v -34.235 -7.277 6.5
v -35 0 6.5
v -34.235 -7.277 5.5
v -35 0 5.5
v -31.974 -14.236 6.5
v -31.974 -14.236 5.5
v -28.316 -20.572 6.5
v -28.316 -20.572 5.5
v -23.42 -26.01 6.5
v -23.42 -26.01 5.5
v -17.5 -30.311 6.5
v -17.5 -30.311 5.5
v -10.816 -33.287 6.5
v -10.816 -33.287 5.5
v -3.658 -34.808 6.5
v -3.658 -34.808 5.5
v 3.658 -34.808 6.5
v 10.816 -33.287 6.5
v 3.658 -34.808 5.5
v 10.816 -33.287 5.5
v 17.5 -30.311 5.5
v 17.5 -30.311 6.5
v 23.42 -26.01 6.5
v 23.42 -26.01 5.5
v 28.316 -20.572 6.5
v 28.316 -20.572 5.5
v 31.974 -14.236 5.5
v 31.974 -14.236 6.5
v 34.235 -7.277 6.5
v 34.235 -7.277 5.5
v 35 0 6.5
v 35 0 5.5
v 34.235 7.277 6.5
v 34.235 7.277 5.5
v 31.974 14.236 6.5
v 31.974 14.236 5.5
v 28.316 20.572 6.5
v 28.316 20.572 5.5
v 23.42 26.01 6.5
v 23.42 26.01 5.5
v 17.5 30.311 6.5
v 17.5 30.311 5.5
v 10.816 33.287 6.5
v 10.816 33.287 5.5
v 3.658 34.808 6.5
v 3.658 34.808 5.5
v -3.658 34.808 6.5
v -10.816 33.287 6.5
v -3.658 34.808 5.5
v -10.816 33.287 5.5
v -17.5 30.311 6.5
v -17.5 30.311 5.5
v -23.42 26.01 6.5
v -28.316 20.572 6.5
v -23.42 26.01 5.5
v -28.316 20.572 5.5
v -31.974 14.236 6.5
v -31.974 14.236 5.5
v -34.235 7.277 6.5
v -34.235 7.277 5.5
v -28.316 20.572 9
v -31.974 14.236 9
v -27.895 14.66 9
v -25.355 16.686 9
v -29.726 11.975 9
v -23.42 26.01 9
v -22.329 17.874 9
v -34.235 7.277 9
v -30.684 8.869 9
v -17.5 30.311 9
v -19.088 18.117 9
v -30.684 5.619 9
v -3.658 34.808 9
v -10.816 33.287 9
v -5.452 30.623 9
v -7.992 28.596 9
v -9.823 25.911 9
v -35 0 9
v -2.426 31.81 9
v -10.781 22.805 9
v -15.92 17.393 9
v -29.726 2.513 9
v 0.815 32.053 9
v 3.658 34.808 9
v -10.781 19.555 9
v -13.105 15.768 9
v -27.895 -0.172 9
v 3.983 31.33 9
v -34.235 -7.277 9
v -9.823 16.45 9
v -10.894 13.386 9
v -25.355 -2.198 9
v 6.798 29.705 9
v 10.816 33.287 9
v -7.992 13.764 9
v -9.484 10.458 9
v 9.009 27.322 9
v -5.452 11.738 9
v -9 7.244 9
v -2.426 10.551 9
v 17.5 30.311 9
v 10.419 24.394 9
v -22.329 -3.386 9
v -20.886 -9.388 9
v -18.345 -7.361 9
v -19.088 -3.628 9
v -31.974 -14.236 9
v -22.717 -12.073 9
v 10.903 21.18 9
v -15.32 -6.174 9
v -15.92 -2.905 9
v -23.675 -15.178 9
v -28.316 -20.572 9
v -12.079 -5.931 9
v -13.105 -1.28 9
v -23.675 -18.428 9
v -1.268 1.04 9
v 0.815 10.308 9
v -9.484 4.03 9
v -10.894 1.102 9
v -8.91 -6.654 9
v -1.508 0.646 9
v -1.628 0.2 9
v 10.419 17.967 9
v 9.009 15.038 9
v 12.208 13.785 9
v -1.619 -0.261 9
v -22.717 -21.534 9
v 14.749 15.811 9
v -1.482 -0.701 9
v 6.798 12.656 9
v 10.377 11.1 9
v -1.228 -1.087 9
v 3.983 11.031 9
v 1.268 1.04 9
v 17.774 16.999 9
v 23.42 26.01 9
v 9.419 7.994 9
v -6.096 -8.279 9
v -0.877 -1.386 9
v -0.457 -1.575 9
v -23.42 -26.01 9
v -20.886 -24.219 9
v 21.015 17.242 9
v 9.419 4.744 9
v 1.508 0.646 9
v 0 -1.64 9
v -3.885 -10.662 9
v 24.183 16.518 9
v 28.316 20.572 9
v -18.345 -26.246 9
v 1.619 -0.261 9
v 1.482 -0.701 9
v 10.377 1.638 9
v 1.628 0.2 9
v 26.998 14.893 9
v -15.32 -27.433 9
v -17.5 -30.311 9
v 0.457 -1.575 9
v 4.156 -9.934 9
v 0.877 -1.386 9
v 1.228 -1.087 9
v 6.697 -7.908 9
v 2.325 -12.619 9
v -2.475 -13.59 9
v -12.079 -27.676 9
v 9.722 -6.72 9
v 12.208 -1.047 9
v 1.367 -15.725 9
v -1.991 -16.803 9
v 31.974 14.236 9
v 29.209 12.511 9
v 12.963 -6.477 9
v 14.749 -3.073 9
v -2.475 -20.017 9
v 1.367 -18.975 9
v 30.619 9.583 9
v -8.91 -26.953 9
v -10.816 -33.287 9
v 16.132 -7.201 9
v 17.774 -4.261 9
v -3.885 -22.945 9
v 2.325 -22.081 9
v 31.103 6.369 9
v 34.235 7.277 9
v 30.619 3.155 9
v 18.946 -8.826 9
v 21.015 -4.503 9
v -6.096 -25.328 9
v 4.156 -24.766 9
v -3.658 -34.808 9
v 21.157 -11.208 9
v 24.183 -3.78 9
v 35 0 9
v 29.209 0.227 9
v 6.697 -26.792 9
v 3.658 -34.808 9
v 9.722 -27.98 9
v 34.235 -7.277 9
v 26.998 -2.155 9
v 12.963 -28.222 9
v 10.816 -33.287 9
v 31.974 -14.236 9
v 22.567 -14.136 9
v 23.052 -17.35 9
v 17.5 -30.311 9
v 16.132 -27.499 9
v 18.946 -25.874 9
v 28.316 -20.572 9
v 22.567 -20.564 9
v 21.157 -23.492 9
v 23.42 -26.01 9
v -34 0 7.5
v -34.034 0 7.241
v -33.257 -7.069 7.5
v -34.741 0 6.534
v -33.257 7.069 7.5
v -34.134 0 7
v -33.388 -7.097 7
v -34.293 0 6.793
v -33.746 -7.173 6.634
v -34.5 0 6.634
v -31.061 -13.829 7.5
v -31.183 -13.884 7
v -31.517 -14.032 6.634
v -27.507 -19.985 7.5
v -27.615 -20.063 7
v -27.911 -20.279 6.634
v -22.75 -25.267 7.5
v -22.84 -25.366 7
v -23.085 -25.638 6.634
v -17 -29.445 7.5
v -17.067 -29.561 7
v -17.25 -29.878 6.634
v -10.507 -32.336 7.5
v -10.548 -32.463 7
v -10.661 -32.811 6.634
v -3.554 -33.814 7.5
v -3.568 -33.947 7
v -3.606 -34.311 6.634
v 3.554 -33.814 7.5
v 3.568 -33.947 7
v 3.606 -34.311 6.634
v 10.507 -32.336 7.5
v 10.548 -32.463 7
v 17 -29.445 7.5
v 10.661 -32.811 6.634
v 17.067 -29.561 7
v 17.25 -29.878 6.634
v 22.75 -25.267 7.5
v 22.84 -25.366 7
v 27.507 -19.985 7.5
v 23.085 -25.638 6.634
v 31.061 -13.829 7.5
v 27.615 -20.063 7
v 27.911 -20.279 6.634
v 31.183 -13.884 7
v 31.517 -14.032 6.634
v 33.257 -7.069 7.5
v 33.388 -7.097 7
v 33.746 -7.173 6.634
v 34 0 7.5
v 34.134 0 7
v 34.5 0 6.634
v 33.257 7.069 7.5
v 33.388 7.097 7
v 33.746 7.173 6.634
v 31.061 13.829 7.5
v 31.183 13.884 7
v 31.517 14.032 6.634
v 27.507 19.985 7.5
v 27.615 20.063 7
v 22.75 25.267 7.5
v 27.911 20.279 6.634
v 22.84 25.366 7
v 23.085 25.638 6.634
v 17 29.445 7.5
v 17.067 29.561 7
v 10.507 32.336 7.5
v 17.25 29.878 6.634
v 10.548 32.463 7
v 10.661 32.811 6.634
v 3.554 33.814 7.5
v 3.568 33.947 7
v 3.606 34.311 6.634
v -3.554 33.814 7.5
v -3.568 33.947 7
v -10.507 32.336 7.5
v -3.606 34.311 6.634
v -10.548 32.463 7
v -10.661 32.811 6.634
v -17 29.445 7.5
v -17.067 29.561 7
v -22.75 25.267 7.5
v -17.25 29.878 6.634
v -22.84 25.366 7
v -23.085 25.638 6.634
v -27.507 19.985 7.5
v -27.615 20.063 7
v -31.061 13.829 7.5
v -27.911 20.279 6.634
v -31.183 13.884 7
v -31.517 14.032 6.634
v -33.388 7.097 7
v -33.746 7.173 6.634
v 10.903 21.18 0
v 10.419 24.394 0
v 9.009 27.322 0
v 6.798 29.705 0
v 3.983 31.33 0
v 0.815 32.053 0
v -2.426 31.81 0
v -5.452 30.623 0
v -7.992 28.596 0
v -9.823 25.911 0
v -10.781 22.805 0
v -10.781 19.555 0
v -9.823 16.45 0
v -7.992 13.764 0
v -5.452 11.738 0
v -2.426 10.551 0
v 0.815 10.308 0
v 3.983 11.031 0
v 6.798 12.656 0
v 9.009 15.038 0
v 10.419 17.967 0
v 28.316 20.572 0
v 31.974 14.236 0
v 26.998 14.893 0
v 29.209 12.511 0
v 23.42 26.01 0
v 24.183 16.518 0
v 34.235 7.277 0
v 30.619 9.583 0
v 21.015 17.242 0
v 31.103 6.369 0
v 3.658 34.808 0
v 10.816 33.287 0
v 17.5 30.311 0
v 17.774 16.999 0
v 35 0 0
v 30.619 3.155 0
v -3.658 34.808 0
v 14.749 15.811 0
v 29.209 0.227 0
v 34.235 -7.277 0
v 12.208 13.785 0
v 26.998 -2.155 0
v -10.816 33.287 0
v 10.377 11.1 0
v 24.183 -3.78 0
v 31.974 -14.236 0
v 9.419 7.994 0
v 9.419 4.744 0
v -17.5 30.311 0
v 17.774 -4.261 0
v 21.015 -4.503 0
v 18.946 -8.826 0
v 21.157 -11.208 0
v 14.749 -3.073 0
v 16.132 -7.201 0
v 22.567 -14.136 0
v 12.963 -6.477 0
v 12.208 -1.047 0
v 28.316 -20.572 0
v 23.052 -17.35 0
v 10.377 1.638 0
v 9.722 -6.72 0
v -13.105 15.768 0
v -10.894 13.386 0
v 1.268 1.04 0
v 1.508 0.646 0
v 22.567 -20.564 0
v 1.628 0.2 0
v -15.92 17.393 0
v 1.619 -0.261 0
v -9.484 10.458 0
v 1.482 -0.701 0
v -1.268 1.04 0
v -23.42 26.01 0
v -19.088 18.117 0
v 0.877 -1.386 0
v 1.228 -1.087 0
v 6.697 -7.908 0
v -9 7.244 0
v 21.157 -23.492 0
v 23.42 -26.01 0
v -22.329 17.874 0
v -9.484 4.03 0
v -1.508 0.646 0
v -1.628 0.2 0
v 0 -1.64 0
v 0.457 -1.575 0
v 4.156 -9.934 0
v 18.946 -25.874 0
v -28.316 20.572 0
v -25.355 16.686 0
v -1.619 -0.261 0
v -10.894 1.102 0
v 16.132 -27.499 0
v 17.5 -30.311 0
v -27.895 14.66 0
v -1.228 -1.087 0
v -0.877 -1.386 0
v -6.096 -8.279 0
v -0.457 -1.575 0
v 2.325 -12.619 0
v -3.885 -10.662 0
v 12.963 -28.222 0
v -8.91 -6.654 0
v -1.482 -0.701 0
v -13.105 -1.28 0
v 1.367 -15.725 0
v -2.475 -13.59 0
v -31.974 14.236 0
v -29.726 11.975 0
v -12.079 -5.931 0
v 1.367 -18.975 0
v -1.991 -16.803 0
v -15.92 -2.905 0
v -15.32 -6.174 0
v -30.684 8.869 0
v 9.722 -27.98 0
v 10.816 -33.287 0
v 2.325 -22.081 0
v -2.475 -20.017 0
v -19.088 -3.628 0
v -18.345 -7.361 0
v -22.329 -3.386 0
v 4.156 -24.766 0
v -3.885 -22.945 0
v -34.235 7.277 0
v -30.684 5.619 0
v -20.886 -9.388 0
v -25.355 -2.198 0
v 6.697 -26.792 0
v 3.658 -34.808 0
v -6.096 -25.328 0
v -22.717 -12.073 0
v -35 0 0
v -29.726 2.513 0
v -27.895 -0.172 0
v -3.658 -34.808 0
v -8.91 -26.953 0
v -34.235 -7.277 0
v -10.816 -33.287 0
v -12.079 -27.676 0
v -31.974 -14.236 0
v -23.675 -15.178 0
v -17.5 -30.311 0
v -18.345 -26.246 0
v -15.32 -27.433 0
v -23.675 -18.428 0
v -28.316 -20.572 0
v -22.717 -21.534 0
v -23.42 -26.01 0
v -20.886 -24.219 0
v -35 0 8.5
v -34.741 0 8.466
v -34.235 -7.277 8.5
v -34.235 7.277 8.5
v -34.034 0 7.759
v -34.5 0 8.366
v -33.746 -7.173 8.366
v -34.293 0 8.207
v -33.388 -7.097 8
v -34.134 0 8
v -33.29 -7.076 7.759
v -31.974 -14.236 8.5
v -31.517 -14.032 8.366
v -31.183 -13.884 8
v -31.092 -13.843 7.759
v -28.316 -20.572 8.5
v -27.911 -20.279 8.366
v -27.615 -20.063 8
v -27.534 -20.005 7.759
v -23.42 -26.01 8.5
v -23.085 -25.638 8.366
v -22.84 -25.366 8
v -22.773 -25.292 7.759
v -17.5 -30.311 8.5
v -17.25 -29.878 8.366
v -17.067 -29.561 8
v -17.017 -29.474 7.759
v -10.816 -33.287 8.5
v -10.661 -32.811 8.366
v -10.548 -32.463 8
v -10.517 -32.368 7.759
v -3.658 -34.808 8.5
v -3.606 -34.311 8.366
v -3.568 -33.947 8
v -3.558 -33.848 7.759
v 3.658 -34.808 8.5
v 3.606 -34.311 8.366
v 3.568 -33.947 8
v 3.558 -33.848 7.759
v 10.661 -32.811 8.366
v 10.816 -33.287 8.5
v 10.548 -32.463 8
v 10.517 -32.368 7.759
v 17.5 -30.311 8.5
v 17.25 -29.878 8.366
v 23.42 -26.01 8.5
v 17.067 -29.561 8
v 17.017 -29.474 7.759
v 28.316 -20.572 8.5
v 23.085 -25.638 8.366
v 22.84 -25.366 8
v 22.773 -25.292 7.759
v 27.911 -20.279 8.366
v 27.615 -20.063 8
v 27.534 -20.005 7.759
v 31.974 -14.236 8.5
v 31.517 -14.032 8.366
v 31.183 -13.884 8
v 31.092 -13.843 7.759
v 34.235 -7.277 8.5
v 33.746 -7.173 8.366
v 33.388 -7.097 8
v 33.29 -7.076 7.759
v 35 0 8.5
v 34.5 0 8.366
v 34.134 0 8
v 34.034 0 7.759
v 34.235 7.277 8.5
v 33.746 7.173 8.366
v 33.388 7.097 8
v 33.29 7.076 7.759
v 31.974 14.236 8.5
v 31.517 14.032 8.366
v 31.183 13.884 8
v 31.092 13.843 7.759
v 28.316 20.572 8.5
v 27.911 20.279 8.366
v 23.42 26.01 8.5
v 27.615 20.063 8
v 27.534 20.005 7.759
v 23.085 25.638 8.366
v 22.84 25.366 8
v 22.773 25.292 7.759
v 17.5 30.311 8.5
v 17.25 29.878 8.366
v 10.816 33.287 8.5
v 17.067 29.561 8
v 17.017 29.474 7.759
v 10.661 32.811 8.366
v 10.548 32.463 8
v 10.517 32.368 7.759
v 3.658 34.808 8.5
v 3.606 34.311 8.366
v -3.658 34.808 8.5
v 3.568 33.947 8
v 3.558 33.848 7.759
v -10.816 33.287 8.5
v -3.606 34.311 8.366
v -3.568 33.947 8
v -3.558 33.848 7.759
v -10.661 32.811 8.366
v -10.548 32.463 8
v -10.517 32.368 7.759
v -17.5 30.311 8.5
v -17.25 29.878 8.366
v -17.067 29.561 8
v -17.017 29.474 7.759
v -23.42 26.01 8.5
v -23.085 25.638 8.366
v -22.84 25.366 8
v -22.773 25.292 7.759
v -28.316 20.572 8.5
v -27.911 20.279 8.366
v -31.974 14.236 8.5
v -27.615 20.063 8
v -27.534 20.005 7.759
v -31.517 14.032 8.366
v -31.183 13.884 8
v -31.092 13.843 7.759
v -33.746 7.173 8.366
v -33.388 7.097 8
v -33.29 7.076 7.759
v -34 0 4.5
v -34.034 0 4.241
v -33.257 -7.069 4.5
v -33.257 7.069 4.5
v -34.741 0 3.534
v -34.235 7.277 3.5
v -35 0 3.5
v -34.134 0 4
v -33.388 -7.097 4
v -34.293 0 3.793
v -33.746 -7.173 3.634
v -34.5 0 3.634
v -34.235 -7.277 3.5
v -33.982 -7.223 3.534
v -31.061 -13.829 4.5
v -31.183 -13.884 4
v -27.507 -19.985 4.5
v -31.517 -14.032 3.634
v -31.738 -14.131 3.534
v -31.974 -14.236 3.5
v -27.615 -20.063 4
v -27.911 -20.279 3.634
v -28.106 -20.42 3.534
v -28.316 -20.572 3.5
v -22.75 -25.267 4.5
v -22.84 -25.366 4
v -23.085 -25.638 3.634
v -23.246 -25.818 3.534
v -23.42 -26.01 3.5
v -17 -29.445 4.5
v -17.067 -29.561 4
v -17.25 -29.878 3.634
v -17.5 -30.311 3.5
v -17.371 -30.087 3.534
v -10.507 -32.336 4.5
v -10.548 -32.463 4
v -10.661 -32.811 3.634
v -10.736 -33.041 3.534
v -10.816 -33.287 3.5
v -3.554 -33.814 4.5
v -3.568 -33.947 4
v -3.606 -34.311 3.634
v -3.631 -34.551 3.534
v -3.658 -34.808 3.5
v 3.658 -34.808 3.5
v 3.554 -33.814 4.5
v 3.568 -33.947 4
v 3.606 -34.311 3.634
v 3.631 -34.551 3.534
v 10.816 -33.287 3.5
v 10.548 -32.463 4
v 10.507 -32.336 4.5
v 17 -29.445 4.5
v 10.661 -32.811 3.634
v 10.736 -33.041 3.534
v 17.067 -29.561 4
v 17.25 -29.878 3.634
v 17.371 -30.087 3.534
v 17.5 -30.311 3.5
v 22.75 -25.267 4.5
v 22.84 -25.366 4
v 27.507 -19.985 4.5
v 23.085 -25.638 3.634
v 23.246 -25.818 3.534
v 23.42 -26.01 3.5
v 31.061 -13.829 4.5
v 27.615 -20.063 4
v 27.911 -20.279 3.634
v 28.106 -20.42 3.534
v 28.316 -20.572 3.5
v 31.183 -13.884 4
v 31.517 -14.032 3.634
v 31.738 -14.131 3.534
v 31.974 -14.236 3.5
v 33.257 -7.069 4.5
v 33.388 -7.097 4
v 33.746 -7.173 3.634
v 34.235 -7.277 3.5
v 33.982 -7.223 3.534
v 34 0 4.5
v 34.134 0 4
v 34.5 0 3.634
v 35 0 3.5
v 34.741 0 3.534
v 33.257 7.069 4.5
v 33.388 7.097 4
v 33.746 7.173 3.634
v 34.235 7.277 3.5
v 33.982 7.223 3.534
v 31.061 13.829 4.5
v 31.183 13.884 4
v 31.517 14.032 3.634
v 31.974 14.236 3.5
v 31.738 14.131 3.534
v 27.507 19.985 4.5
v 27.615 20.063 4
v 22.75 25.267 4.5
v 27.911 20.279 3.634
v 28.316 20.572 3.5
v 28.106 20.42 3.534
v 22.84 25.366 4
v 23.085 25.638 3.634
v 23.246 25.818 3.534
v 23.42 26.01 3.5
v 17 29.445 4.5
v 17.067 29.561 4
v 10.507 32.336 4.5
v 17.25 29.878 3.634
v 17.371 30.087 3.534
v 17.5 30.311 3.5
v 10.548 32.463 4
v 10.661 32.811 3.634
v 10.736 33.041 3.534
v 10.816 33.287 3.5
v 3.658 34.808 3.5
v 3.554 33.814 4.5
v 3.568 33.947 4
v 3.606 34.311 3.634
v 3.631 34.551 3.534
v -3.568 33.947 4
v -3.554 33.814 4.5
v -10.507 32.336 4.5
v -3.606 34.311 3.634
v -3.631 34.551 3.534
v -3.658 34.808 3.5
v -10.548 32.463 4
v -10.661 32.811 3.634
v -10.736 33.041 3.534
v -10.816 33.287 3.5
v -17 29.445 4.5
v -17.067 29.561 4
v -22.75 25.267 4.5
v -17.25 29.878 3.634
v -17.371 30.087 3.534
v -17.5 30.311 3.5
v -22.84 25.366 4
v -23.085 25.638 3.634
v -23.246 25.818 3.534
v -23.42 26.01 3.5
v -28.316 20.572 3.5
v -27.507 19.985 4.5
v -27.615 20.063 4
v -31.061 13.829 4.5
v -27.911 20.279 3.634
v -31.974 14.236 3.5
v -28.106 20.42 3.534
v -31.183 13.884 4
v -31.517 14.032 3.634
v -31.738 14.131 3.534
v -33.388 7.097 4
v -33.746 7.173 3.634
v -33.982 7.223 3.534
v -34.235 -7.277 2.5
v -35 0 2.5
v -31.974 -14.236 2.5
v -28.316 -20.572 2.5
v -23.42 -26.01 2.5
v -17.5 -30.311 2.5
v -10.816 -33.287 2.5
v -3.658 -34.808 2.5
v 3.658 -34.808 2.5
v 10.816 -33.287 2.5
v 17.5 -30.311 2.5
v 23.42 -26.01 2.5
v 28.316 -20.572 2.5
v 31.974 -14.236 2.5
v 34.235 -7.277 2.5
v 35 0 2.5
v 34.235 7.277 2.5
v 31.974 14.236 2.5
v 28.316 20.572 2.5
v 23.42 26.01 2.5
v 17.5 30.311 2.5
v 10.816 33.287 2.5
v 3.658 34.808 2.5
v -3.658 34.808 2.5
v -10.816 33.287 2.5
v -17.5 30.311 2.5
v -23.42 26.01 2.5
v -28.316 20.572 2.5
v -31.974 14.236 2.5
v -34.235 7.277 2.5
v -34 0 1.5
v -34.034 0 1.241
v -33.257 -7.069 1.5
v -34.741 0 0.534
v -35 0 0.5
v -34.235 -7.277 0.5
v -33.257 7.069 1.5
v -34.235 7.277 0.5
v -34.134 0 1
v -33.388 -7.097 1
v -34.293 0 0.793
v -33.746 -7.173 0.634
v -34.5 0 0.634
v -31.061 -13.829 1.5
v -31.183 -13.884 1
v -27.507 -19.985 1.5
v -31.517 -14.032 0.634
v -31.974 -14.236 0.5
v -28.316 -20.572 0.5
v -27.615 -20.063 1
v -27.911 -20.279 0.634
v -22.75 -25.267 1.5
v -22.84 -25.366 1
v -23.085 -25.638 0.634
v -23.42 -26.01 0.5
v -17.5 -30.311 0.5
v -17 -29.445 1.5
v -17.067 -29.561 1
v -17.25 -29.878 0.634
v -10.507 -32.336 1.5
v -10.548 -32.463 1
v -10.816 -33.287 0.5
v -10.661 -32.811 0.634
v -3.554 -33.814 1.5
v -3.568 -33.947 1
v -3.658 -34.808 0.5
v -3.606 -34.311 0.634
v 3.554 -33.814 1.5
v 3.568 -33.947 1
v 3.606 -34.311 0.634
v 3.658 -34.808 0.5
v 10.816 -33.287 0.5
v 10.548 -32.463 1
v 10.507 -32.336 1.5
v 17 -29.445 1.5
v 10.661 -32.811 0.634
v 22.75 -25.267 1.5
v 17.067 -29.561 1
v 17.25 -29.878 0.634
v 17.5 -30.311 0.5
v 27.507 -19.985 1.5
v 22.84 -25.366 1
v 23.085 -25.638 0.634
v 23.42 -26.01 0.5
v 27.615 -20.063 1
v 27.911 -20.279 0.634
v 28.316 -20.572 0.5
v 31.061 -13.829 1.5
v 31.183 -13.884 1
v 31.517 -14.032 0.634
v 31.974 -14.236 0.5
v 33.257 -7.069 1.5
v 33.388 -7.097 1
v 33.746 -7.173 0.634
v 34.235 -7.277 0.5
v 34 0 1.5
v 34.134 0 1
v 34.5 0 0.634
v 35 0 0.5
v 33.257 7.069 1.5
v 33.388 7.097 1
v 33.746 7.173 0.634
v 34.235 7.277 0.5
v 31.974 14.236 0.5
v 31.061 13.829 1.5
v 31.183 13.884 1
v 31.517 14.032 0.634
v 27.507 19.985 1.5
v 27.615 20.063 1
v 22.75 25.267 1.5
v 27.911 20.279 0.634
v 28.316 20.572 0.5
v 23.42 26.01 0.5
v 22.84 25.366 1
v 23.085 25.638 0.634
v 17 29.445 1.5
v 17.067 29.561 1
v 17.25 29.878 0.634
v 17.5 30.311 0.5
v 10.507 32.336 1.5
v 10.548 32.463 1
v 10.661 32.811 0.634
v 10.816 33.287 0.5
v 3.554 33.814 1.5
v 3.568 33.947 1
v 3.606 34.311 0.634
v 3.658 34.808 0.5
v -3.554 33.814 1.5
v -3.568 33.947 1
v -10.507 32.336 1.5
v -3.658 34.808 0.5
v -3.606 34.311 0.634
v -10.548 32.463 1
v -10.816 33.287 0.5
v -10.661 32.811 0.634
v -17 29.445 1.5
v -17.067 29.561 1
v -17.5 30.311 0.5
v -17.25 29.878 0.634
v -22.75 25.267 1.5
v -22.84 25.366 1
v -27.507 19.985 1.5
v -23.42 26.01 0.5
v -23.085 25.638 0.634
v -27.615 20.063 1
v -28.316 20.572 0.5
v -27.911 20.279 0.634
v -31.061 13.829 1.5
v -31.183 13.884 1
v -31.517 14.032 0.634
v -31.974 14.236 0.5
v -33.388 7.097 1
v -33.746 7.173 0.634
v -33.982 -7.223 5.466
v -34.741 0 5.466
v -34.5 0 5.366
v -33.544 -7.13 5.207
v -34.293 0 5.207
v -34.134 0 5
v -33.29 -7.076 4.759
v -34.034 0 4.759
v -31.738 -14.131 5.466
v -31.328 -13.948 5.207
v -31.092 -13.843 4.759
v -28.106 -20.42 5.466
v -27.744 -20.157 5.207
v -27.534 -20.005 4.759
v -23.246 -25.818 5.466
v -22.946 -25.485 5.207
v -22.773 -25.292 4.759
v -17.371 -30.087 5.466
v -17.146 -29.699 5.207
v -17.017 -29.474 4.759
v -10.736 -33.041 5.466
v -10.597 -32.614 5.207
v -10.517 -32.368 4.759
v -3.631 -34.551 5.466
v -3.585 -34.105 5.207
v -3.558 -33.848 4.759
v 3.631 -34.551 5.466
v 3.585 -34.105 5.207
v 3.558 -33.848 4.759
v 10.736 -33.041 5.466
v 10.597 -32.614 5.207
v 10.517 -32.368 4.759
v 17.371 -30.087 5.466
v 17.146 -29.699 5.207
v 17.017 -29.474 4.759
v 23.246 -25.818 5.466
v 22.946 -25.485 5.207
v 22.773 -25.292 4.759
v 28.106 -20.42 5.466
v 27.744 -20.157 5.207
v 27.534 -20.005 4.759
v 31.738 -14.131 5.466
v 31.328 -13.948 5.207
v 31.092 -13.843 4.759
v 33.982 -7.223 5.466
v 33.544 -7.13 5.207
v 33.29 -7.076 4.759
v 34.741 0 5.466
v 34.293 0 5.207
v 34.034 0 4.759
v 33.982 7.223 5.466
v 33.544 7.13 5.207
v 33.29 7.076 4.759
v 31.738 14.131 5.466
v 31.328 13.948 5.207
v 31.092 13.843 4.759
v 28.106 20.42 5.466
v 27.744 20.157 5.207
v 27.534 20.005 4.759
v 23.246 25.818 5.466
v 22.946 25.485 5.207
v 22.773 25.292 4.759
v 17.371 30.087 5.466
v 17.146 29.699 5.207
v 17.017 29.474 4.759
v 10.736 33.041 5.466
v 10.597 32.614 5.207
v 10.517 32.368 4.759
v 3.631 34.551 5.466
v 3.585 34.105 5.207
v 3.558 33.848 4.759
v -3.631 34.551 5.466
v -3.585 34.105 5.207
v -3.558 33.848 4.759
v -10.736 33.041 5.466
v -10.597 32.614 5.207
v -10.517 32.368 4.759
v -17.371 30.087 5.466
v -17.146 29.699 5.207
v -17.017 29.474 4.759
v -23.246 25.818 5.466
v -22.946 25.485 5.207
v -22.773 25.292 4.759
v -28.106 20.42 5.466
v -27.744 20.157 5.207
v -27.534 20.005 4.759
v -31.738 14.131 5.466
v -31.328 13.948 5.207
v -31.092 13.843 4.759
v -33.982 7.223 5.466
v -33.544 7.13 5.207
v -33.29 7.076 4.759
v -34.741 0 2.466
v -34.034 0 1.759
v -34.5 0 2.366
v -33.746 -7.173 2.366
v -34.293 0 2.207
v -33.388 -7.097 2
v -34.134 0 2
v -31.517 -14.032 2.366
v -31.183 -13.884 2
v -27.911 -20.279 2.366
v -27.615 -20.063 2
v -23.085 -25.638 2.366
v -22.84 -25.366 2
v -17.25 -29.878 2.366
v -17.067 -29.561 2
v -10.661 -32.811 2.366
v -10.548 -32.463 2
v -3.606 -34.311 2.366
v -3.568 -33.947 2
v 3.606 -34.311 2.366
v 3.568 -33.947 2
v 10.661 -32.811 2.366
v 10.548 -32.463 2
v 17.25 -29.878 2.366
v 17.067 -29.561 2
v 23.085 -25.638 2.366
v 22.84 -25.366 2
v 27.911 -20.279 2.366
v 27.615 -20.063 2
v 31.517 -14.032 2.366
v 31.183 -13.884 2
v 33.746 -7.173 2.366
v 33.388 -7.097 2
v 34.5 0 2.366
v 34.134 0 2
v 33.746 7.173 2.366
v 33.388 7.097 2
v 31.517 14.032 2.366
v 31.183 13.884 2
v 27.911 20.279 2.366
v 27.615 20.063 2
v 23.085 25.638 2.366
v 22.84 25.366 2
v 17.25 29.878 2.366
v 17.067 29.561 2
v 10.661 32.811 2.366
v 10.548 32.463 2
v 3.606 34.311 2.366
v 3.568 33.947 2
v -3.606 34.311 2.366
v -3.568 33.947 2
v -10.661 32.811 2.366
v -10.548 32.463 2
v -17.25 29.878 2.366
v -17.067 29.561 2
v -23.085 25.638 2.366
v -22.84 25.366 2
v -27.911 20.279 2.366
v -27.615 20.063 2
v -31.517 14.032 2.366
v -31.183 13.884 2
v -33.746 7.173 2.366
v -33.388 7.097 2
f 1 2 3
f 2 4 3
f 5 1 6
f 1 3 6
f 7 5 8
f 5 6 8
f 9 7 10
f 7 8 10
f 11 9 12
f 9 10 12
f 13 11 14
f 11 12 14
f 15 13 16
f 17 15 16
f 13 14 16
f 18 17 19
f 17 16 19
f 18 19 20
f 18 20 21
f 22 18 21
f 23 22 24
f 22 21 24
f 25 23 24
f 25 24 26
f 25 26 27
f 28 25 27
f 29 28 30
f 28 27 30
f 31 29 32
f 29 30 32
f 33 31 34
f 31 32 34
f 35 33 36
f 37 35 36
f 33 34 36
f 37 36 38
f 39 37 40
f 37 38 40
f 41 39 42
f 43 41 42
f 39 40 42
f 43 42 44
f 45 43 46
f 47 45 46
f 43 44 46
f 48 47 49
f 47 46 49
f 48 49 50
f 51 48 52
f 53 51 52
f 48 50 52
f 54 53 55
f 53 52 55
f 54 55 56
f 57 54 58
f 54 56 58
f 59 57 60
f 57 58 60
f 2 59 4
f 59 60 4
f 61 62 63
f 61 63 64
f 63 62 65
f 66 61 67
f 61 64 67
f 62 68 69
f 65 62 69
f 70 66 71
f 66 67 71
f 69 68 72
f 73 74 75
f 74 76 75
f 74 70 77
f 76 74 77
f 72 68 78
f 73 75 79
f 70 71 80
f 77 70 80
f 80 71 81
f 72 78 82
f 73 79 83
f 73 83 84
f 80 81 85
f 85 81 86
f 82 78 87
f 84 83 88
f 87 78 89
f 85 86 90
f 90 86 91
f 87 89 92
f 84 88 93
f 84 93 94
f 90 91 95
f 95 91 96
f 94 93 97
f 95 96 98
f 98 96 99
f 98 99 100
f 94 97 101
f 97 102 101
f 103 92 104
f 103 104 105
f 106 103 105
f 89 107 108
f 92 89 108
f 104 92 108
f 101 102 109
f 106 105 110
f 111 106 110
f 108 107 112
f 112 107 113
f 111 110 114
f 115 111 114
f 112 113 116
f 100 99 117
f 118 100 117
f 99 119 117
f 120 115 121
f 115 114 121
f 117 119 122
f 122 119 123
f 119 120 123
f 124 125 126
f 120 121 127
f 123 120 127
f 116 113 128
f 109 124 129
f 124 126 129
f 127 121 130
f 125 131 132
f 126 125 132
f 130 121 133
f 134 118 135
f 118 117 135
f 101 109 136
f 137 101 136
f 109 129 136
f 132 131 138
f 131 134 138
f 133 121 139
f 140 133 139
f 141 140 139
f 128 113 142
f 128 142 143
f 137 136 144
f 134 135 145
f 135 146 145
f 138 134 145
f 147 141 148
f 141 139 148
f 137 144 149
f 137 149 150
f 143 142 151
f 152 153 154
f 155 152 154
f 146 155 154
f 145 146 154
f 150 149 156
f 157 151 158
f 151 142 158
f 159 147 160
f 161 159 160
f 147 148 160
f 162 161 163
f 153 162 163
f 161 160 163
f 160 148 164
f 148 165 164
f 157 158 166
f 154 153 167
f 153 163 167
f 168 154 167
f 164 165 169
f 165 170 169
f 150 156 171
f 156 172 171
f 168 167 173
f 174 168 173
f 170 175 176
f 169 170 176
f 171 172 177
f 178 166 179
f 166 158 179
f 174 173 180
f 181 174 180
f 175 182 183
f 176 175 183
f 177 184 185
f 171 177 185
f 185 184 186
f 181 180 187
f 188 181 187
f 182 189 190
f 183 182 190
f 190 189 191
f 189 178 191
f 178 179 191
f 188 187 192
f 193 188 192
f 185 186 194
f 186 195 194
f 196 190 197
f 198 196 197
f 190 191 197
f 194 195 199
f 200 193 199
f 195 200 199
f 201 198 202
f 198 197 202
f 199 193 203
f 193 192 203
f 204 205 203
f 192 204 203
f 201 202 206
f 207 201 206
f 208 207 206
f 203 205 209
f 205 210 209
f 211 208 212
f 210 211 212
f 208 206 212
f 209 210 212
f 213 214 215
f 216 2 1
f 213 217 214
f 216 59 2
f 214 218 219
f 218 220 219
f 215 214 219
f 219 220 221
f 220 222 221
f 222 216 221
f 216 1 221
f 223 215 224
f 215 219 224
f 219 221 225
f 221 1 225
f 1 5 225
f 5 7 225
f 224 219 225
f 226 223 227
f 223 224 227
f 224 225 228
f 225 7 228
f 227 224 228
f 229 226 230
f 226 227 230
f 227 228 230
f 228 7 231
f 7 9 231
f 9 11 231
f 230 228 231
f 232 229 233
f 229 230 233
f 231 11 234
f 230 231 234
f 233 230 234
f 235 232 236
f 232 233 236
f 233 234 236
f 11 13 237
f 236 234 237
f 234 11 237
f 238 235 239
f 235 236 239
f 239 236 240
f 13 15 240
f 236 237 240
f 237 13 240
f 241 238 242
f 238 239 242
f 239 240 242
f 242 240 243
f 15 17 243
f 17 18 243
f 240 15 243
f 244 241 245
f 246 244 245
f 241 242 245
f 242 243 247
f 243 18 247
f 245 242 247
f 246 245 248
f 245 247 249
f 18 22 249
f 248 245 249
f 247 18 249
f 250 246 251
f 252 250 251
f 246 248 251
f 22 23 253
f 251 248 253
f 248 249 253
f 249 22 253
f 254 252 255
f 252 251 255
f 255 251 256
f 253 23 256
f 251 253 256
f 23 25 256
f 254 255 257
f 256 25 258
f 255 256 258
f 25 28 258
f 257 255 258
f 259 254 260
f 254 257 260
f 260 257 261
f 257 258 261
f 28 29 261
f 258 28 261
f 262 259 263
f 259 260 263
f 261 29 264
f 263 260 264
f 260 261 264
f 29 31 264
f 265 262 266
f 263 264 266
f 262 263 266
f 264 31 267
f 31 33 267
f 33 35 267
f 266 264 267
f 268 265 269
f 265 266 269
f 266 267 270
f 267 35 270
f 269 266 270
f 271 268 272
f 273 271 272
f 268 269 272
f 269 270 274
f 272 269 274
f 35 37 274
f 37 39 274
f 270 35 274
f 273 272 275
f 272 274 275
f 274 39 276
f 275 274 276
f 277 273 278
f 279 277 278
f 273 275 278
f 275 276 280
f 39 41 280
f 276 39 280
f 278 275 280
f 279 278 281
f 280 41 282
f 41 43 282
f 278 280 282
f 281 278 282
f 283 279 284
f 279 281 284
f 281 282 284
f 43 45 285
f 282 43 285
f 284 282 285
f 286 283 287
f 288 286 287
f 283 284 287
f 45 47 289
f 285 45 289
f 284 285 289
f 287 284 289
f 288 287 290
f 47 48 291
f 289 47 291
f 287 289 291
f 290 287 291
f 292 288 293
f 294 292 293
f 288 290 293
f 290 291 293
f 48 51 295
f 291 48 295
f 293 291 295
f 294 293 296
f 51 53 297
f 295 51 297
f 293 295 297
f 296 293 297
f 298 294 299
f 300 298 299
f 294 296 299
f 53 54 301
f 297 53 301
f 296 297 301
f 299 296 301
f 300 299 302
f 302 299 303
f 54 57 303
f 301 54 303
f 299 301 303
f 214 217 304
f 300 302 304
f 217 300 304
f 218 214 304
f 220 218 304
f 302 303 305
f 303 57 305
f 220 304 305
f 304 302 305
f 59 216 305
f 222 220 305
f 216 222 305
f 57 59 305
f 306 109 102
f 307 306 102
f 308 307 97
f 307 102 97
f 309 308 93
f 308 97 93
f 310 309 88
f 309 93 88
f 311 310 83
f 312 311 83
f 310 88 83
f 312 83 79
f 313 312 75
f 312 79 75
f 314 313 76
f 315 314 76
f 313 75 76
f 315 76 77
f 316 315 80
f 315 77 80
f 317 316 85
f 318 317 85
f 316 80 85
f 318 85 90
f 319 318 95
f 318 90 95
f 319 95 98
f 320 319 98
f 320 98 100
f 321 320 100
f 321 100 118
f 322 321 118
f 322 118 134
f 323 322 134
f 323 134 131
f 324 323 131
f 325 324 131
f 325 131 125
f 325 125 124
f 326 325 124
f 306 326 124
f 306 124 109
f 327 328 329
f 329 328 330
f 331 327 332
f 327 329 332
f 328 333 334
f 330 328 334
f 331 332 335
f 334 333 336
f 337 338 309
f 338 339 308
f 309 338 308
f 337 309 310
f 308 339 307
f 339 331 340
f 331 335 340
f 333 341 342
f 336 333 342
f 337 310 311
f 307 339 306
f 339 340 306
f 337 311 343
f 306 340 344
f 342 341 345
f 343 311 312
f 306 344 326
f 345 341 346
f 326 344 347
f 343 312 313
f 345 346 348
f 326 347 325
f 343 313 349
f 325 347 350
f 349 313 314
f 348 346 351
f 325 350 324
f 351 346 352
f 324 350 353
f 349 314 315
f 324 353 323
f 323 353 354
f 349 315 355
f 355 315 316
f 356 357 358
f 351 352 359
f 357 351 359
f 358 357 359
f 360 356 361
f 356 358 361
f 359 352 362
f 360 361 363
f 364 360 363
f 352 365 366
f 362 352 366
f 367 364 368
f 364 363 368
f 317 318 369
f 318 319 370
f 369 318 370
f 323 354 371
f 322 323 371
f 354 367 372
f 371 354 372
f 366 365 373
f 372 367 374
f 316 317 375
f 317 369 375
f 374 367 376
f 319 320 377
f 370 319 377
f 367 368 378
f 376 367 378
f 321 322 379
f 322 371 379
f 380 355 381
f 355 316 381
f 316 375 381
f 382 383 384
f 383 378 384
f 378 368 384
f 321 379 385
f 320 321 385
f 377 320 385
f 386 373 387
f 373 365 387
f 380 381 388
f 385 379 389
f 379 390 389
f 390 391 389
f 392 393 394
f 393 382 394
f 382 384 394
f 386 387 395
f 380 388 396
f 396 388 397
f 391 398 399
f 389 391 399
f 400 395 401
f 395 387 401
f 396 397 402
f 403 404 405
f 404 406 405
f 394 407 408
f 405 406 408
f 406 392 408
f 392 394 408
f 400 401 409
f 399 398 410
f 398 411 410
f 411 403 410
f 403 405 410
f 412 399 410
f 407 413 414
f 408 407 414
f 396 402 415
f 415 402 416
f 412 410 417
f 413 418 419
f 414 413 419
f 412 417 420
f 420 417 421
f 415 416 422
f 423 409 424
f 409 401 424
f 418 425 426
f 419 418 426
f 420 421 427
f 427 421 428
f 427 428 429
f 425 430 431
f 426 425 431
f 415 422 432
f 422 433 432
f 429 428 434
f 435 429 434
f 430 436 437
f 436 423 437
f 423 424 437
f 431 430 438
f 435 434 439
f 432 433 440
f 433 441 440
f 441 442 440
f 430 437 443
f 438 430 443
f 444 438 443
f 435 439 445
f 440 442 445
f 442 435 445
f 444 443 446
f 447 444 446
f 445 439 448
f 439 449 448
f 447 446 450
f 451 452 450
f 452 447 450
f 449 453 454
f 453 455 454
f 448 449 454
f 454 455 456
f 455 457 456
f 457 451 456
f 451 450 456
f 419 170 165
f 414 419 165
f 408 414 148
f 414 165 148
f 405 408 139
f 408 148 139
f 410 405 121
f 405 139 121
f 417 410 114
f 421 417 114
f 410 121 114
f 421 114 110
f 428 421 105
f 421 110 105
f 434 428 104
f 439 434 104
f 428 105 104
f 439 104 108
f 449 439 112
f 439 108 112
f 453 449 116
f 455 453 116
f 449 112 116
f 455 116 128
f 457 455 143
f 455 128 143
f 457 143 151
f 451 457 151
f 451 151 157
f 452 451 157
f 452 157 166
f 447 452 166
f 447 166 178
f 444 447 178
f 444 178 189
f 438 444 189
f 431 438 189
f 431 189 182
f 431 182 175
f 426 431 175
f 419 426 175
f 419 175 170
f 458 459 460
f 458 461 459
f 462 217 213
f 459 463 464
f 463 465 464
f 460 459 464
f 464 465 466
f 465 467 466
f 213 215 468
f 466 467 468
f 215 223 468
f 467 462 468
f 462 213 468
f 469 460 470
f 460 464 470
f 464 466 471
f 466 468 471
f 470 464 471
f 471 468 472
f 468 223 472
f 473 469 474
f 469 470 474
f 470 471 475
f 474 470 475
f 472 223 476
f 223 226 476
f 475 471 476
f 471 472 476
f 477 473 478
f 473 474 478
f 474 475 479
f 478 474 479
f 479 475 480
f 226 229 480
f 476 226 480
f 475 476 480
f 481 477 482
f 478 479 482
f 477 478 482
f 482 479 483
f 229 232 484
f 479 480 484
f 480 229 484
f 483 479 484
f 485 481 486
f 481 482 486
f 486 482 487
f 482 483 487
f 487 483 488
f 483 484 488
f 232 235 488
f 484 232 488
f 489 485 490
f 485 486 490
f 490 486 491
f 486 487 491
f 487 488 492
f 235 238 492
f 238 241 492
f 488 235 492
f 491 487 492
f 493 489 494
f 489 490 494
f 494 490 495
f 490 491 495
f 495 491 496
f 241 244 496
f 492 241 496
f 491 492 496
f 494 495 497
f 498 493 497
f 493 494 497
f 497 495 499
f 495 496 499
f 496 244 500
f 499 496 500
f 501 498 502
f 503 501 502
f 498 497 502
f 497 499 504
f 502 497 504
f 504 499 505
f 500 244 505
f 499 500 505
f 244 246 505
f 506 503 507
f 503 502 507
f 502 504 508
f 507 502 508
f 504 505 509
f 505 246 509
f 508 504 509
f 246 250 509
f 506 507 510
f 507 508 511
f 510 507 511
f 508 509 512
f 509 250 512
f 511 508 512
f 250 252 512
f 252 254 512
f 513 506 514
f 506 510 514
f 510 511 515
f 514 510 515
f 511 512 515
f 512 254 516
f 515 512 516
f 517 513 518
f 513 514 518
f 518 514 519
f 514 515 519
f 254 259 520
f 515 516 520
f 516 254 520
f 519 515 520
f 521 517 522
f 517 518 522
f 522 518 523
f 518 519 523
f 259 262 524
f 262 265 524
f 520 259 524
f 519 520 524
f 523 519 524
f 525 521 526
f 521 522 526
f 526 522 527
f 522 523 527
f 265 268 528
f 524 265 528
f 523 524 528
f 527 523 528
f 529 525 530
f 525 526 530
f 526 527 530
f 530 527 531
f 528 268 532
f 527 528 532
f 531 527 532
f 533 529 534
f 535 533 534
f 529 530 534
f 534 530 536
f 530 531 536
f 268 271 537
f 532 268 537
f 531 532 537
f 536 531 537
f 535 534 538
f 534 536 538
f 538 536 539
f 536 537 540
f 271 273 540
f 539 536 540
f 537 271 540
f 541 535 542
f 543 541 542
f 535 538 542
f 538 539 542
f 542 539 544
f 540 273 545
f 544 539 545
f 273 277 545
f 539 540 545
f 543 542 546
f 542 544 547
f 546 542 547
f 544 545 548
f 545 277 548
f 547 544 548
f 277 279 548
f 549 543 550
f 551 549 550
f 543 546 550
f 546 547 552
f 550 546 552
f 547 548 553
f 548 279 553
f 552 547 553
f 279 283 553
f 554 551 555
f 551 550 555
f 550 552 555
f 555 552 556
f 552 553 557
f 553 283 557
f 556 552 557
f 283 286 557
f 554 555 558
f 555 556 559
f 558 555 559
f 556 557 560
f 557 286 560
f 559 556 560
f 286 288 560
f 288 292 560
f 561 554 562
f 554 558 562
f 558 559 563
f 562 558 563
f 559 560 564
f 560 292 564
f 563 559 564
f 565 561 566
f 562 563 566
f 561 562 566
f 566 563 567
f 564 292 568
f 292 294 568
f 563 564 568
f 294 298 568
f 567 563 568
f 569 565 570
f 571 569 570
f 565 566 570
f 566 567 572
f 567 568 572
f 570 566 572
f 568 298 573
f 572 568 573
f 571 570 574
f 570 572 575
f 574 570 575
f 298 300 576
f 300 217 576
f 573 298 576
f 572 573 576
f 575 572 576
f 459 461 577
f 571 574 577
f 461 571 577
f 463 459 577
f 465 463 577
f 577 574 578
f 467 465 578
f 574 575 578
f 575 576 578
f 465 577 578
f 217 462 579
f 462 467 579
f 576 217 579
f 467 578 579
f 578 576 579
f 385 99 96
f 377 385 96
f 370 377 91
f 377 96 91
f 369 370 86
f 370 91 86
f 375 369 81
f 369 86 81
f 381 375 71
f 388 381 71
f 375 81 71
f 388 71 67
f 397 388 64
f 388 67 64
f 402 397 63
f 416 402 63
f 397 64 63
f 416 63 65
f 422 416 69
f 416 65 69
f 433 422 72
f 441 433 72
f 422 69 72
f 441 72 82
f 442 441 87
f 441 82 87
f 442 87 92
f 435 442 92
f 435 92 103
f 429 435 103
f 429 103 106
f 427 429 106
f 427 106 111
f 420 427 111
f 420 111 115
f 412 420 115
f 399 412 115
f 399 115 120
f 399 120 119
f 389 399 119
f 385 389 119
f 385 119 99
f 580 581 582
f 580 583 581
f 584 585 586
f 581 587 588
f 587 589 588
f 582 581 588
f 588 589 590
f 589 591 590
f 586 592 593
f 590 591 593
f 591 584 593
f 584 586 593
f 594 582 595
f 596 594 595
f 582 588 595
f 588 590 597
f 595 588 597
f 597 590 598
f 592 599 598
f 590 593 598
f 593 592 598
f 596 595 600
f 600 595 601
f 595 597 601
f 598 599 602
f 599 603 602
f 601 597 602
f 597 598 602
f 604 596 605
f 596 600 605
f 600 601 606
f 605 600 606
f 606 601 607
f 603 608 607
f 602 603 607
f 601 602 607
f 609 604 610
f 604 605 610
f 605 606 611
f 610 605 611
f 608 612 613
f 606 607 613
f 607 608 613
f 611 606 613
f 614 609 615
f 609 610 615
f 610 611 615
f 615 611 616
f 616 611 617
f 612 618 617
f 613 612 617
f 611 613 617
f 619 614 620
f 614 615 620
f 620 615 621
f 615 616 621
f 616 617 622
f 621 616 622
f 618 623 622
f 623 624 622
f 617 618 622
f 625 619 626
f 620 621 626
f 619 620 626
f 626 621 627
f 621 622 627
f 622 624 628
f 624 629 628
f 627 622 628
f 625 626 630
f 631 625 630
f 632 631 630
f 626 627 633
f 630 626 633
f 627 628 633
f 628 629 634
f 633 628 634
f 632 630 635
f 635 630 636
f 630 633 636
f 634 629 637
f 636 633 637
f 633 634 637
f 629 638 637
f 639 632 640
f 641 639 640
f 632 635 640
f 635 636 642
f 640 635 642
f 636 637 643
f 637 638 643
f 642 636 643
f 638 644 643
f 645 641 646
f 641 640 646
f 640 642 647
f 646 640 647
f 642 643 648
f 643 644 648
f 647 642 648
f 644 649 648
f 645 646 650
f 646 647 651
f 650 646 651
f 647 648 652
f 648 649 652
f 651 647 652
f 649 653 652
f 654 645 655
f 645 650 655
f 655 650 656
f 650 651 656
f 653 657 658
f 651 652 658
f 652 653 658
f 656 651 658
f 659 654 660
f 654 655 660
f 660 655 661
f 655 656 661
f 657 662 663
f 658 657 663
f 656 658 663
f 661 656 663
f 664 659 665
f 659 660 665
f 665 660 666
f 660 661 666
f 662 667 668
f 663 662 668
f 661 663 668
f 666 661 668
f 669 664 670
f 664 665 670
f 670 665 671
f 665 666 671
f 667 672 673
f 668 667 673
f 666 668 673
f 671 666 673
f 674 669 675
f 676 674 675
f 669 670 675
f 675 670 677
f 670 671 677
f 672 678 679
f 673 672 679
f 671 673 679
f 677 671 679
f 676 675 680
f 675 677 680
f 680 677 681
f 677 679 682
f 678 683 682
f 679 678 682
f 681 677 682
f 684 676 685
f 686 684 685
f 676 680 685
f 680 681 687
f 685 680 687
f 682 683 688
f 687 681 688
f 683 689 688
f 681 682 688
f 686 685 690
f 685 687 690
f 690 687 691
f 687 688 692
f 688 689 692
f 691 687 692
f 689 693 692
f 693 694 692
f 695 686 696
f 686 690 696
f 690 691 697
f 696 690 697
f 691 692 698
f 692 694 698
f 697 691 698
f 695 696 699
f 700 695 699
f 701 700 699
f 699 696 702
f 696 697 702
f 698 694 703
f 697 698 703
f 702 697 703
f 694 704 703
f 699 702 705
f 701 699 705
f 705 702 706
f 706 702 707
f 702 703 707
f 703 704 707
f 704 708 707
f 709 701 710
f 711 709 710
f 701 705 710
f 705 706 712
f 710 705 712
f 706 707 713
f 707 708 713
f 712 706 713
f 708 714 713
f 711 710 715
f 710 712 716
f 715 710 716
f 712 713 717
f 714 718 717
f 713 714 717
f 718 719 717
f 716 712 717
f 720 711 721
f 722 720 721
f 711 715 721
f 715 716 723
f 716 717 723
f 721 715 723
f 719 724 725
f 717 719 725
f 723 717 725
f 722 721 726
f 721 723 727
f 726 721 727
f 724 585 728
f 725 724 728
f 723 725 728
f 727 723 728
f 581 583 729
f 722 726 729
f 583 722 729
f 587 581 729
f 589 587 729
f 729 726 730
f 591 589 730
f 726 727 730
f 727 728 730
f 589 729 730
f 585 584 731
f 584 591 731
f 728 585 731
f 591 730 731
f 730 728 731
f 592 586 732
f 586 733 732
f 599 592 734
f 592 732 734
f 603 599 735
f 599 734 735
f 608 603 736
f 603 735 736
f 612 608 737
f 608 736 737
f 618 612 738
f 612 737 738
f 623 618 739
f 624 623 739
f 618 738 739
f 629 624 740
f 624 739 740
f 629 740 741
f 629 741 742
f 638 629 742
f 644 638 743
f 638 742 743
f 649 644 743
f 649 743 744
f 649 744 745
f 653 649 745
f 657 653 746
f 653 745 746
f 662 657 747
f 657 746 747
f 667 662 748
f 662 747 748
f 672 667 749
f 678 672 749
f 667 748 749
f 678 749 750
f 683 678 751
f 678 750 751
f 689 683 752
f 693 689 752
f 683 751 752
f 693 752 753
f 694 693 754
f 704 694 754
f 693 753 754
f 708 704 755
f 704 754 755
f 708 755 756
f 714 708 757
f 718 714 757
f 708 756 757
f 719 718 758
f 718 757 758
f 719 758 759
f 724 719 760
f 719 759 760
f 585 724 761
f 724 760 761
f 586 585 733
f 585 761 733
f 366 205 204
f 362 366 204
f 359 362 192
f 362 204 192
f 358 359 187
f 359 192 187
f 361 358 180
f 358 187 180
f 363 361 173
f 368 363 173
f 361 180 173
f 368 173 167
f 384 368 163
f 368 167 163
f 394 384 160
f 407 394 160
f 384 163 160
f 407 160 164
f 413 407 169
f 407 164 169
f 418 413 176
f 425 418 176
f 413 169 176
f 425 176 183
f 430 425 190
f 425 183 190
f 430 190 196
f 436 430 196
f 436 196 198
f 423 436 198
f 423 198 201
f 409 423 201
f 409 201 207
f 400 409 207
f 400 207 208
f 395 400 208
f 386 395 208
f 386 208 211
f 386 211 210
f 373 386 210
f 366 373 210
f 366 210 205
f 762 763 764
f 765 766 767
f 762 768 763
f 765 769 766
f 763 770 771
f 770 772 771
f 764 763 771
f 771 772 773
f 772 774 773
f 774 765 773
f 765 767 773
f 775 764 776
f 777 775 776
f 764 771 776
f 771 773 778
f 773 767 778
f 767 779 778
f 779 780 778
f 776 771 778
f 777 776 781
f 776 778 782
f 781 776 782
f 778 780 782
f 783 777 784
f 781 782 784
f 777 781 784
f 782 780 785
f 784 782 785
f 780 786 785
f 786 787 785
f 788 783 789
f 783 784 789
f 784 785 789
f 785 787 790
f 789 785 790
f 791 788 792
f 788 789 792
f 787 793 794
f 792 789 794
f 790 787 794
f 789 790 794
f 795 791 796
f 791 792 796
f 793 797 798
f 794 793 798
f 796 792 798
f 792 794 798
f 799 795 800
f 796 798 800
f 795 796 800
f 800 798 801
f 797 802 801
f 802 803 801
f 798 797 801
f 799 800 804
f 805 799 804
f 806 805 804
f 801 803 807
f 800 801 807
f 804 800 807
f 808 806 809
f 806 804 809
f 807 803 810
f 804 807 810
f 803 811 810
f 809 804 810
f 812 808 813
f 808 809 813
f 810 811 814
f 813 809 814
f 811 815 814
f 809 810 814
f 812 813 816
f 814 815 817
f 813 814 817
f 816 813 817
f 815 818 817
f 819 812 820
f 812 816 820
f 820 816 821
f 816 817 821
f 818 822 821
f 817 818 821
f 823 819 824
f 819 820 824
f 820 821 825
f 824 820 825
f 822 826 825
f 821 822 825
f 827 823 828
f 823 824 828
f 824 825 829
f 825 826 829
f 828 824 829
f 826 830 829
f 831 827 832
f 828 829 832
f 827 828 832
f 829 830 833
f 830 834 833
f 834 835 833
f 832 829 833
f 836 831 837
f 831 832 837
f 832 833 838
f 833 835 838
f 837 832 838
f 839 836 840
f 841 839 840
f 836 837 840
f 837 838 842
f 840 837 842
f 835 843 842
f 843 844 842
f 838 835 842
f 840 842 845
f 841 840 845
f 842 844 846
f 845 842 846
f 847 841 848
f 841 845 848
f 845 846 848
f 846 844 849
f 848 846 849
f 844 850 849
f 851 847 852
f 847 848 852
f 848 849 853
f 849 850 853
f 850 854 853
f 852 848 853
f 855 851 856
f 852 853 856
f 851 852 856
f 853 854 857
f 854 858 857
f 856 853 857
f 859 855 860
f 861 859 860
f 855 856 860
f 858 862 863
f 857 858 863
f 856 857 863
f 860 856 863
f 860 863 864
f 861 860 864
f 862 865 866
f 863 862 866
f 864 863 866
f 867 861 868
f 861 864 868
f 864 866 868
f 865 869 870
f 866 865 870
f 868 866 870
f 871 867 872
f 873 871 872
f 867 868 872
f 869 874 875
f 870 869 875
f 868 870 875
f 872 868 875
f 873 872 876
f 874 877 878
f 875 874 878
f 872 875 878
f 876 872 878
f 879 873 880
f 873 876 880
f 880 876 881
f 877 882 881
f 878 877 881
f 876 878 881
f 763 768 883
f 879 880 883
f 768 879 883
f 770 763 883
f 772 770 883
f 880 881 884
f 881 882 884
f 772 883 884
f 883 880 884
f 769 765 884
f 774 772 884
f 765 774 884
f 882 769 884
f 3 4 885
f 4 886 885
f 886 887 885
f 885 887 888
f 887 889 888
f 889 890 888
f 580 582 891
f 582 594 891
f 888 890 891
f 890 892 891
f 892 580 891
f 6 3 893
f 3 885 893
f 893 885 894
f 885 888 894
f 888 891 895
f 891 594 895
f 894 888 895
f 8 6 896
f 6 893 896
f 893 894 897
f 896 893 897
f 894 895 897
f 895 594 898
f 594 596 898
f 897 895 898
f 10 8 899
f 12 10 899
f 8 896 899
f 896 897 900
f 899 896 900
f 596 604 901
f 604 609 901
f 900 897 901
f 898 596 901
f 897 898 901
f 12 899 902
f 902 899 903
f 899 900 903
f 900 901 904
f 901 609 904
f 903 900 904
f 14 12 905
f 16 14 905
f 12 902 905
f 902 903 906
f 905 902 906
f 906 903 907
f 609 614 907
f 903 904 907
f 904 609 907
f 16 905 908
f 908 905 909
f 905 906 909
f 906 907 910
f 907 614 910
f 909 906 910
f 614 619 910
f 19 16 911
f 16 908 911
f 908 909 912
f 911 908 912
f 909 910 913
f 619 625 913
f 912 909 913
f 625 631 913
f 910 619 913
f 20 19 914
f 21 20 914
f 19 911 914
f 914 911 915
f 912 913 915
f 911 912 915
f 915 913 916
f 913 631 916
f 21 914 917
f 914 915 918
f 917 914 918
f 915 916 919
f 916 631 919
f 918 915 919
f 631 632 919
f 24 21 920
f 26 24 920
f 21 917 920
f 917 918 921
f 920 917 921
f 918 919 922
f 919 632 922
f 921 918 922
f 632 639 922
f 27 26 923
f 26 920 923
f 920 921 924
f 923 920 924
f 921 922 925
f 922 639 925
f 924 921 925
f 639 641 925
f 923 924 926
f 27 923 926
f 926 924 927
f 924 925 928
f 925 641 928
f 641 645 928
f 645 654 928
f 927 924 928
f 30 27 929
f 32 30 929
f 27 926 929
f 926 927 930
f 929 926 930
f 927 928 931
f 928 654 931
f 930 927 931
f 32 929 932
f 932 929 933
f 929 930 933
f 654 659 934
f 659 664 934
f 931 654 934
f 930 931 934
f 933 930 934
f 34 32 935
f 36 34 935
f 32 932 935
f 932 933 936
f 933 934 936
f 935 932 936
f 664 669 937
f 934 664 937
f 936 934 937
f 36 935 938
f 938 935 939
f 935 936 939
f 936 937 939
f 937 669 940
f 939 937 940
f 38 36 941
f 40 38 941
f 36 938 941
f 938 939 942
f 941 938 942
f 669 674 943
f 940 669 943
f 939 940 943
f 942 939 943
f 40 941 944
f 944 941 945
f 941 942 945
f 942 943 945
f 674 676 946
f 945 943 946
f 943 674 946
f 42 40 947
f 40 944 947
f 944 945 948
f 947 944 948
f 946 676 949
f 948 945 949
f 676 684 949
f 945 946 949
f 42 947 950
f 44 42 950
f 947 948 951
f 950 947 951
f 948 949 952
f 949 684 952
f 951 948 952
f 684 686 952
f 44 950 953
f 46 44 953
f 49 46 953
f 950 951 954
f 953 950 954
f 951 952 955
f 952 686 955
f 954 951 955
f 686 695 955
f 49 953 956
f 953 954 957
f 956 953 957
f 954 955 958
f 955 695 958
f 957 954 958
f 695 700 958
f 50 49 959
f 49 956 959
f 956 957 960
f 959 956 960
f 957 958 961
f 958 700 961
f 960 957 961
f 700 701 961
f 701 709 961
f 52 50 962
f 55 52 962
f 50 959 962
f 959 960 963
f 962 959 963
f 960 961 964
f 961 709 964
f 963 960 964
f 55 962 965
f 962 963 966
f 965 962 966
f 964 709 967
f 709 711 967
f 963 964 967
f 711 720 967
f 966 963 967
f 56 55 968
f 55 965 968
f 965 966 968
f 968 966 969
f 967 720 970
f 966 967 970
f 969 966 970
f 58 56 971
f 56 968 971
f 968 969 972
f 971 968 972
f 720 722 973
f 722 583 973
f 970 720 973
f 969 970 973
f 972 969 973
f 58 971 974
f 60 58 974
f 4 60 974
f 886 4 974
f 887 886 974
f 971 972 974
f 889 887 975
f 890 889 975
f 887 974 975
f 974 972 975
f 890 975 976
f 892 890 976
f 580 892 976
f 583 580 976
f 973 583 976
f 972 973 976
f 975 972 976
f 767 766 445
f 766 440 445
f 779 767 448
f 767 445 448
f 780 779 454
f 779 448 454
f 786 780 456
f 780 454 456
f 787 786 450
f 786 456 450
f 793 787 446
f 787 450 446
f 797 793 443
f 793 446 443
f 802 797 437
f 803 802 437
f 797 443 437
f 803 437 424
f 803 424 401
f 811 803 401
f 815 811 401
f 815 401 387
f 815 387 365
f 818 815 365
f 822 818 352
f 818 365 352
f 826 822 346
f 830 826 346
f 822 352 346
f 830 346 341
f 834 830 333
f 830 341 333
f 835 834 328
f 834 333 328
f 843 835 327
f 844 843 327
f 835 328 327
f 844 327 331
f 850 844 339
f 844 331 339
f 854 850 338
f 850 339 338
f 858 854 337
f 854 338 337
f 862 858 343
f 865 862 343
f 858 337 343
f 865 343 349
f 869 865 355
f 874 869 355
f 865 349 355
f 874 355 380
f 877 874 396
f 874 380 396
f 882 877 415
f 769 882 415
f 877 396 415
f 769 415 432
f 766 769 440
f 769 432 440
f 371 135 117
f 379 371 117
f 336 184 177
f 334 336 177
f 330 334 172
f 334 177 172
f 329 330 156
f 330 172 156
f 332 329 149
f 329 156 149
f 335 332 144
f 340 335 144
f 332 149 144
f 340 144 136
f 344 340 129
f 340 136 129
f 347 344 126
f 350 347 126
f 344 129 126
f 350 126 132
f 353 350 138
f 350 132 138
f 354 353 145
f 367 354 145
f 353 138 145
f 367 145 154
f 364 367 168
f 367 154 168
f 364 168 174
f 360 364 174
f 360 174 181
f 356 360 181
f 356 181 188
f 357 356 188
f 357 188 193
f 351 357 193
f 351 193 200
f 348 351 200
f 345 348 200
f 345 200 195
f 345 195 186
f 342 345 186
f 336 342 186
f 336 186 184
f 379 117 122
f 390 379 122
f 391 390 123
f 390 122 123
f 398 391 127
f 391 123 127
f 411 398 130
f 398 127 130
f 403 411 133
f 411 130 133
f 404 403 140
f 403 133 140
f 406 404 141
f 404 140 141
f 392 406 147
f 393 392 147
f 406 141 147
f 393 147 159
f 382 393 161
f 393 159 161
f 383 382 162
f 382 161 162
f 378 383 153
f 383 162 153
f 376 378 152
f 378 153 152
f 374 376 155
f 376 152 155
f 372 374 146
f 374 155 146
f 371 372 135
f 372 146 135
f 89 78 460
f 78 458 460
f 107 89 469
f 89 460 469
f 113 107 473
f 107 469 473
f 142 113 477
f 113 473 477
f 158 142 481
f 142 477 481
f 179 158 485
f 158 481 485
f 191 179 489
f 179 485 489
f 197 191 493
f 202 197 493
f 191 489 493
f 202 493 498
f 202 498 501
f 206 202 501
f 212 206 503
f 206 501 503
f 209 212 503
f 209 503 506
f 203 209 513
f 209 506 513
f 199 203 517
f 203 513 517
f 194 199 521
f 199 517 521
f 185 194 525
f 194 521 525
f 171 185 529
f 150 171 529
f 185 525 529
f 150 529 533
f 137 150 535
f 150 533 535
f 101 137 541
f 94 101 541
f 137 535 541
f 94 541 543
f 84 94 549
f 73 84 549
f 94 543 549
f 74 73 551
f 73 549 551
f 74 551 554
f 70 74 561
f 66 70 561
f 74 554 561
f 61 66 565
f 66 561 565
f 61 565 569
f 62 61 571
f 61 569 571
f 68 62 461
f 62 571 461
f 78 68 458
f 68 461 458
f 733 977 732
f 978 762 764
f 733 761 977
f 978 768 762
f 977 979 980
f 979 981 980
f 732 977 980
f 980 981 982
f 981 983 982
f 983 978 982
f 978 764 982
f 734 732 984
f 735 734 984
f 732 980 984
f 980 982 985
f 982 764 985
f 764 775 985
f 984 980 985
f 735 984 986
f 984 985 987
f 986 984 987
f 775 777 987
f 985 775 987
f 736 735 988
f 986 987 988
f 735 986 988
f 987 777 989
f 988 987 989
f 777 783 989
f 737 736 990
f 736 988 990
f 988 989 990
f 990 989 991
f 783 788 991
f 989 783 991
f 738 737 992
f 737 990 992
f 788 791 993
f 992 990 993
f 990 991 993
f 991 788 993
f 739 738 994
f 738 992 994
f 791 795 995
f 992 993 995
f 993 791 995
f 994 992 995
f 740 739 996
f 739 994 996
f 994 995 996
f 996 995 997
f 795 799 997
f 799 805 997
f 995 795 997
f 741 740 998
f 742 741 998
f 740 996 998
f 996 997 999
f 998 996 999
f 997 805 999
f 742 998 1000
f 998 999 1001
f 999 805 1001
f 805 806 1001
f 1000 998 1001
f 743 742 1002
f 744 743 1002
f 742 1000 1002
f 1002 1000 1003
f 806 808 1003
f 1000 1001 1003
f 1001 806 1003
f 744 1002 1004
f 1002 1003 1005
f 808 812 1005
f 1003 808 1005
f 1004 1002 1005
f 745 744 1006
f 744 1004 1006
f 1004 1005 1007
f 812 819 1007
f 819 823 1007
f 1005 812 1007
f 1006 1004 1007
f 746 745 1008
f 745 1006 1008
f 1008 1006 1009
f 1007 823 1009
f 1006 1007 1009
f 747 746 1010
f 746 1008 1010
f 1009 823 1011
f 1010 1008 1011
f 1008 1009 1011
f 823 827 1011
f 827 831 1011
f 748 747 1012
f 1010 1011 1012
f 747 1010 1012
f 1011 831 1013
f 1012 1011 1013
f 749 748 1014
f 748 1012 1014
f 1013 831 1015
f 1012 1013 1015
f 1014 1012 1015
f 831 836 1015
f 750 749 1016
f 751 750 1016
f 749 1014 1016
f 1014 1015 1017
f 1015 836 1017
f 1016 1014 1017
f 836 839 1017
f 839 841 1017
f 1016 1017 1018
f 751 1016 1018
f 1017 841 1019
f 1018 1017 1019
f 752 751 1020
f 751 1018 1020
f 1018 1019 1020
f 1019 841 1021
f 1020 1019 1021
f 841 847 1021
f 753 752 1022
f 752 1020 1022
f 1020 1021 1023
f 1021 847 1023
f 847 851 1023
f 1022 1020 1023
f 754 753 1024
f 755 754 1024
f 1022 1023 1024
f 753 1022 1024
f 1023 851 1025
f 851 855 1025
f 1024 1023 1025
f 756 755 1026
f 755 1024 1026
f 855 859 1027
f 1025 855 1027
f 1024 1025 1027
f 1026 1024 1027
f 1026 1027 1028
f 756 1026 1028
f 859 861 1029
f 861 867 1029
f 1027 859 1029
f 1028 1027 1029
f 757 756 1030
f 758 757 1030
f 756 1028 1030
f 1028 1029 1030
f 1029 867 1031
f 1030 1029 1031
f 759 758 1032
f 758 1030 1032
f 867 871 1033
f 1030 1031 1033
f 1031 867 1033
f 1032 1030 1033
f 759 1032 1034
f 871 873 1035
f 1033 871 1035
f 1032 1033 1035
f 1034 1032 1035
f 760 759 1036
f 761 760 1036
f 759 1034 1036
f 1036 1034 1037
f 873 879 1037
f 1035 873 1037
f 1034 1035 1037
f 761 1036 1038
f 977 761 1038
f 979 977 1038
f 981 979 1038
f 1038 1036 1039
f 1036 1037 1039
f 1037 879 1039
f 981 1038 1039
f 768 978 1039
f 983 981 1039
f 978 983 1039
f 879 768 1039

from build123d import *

# Parameters (mm, degrees)
F3_DEPTH = 9.001
F4_R     = 10.903033
F5_DEPTH = 9.001


with BuildPart() as f1:
    # F0 (on Front) → F1 (revolve)
    with BuildSketch(Plane.XZ):
        with BuildLine():
            Line((-35, 0), (0, 0))
            Line((0, 0), (0, 9))
            Line((0, 9), (-35, 9))
            Line((-35, 9), (-35, 8.5))
            ThreePointArc((-35, 8.5), (-34.292893, 8.207107), (-34, 7.5))
            ThreePointArc((-34, 7.5), (-34.292893, 6.792893), (-35, 6.5))
            Line((-35, 6.5), (-35, 5.5))
            ThreePointArc((-35, 5.5), (-34.292893, 5.207107), (-34, 4.5))
            ThreePointArc((-34, 4.5), (-34.292893, 3.792893), (-35, 3.5))
            Line((-35, 3.5), (-35, 2.5))
            ThreePointArc((-35, 2.5), (-34.292893, 2.207107), (-34, 1.5))
            ThreePointArc((-34, 1.5), (-34.292893, 0.792893), (-35, 0.5))
            Line((-35, 0.5), (-35, 0))
        make_face()
    revolve(axis=Axis((0, 0, 4.5), (0, 0, 1)))

    # F2 (on face) → F3 (cut, through all)
    with BuildSketch(Plane.XY.offset(9)):
        with BuildLine():
            Line((1.268069, 1.04), (-1.268069, 1.04))
            ThreePointArc((-1.268069, 1.04), (0, -1.64), (1.268069, 1.04))
        make_face()
    extrude(amount=-F3_DEPTH, mode=Mode.SUBTRACT)

    # F4 (on face) → F5 (cut, through all)
    with BuildSketch(Plane.XY.offset(9)):
        with Locations((0, 21.180328)):
            Circle(F4_R)
        with Locations((20.200038, 6.369047)):
            Circle(F4_R)
        with Locations((12.148537, -17.349909)):
            Circle(F4_R)
        with Locations((-12.893767, -16.803484)):
            Circle(F4_R)
        with Locations((-19.902998, 7.244099)):
            Circle(F4_R)
    extrude(amount=-F5_DEPTH, mode=Mode.SUBTRACT)


solid = f1.part
